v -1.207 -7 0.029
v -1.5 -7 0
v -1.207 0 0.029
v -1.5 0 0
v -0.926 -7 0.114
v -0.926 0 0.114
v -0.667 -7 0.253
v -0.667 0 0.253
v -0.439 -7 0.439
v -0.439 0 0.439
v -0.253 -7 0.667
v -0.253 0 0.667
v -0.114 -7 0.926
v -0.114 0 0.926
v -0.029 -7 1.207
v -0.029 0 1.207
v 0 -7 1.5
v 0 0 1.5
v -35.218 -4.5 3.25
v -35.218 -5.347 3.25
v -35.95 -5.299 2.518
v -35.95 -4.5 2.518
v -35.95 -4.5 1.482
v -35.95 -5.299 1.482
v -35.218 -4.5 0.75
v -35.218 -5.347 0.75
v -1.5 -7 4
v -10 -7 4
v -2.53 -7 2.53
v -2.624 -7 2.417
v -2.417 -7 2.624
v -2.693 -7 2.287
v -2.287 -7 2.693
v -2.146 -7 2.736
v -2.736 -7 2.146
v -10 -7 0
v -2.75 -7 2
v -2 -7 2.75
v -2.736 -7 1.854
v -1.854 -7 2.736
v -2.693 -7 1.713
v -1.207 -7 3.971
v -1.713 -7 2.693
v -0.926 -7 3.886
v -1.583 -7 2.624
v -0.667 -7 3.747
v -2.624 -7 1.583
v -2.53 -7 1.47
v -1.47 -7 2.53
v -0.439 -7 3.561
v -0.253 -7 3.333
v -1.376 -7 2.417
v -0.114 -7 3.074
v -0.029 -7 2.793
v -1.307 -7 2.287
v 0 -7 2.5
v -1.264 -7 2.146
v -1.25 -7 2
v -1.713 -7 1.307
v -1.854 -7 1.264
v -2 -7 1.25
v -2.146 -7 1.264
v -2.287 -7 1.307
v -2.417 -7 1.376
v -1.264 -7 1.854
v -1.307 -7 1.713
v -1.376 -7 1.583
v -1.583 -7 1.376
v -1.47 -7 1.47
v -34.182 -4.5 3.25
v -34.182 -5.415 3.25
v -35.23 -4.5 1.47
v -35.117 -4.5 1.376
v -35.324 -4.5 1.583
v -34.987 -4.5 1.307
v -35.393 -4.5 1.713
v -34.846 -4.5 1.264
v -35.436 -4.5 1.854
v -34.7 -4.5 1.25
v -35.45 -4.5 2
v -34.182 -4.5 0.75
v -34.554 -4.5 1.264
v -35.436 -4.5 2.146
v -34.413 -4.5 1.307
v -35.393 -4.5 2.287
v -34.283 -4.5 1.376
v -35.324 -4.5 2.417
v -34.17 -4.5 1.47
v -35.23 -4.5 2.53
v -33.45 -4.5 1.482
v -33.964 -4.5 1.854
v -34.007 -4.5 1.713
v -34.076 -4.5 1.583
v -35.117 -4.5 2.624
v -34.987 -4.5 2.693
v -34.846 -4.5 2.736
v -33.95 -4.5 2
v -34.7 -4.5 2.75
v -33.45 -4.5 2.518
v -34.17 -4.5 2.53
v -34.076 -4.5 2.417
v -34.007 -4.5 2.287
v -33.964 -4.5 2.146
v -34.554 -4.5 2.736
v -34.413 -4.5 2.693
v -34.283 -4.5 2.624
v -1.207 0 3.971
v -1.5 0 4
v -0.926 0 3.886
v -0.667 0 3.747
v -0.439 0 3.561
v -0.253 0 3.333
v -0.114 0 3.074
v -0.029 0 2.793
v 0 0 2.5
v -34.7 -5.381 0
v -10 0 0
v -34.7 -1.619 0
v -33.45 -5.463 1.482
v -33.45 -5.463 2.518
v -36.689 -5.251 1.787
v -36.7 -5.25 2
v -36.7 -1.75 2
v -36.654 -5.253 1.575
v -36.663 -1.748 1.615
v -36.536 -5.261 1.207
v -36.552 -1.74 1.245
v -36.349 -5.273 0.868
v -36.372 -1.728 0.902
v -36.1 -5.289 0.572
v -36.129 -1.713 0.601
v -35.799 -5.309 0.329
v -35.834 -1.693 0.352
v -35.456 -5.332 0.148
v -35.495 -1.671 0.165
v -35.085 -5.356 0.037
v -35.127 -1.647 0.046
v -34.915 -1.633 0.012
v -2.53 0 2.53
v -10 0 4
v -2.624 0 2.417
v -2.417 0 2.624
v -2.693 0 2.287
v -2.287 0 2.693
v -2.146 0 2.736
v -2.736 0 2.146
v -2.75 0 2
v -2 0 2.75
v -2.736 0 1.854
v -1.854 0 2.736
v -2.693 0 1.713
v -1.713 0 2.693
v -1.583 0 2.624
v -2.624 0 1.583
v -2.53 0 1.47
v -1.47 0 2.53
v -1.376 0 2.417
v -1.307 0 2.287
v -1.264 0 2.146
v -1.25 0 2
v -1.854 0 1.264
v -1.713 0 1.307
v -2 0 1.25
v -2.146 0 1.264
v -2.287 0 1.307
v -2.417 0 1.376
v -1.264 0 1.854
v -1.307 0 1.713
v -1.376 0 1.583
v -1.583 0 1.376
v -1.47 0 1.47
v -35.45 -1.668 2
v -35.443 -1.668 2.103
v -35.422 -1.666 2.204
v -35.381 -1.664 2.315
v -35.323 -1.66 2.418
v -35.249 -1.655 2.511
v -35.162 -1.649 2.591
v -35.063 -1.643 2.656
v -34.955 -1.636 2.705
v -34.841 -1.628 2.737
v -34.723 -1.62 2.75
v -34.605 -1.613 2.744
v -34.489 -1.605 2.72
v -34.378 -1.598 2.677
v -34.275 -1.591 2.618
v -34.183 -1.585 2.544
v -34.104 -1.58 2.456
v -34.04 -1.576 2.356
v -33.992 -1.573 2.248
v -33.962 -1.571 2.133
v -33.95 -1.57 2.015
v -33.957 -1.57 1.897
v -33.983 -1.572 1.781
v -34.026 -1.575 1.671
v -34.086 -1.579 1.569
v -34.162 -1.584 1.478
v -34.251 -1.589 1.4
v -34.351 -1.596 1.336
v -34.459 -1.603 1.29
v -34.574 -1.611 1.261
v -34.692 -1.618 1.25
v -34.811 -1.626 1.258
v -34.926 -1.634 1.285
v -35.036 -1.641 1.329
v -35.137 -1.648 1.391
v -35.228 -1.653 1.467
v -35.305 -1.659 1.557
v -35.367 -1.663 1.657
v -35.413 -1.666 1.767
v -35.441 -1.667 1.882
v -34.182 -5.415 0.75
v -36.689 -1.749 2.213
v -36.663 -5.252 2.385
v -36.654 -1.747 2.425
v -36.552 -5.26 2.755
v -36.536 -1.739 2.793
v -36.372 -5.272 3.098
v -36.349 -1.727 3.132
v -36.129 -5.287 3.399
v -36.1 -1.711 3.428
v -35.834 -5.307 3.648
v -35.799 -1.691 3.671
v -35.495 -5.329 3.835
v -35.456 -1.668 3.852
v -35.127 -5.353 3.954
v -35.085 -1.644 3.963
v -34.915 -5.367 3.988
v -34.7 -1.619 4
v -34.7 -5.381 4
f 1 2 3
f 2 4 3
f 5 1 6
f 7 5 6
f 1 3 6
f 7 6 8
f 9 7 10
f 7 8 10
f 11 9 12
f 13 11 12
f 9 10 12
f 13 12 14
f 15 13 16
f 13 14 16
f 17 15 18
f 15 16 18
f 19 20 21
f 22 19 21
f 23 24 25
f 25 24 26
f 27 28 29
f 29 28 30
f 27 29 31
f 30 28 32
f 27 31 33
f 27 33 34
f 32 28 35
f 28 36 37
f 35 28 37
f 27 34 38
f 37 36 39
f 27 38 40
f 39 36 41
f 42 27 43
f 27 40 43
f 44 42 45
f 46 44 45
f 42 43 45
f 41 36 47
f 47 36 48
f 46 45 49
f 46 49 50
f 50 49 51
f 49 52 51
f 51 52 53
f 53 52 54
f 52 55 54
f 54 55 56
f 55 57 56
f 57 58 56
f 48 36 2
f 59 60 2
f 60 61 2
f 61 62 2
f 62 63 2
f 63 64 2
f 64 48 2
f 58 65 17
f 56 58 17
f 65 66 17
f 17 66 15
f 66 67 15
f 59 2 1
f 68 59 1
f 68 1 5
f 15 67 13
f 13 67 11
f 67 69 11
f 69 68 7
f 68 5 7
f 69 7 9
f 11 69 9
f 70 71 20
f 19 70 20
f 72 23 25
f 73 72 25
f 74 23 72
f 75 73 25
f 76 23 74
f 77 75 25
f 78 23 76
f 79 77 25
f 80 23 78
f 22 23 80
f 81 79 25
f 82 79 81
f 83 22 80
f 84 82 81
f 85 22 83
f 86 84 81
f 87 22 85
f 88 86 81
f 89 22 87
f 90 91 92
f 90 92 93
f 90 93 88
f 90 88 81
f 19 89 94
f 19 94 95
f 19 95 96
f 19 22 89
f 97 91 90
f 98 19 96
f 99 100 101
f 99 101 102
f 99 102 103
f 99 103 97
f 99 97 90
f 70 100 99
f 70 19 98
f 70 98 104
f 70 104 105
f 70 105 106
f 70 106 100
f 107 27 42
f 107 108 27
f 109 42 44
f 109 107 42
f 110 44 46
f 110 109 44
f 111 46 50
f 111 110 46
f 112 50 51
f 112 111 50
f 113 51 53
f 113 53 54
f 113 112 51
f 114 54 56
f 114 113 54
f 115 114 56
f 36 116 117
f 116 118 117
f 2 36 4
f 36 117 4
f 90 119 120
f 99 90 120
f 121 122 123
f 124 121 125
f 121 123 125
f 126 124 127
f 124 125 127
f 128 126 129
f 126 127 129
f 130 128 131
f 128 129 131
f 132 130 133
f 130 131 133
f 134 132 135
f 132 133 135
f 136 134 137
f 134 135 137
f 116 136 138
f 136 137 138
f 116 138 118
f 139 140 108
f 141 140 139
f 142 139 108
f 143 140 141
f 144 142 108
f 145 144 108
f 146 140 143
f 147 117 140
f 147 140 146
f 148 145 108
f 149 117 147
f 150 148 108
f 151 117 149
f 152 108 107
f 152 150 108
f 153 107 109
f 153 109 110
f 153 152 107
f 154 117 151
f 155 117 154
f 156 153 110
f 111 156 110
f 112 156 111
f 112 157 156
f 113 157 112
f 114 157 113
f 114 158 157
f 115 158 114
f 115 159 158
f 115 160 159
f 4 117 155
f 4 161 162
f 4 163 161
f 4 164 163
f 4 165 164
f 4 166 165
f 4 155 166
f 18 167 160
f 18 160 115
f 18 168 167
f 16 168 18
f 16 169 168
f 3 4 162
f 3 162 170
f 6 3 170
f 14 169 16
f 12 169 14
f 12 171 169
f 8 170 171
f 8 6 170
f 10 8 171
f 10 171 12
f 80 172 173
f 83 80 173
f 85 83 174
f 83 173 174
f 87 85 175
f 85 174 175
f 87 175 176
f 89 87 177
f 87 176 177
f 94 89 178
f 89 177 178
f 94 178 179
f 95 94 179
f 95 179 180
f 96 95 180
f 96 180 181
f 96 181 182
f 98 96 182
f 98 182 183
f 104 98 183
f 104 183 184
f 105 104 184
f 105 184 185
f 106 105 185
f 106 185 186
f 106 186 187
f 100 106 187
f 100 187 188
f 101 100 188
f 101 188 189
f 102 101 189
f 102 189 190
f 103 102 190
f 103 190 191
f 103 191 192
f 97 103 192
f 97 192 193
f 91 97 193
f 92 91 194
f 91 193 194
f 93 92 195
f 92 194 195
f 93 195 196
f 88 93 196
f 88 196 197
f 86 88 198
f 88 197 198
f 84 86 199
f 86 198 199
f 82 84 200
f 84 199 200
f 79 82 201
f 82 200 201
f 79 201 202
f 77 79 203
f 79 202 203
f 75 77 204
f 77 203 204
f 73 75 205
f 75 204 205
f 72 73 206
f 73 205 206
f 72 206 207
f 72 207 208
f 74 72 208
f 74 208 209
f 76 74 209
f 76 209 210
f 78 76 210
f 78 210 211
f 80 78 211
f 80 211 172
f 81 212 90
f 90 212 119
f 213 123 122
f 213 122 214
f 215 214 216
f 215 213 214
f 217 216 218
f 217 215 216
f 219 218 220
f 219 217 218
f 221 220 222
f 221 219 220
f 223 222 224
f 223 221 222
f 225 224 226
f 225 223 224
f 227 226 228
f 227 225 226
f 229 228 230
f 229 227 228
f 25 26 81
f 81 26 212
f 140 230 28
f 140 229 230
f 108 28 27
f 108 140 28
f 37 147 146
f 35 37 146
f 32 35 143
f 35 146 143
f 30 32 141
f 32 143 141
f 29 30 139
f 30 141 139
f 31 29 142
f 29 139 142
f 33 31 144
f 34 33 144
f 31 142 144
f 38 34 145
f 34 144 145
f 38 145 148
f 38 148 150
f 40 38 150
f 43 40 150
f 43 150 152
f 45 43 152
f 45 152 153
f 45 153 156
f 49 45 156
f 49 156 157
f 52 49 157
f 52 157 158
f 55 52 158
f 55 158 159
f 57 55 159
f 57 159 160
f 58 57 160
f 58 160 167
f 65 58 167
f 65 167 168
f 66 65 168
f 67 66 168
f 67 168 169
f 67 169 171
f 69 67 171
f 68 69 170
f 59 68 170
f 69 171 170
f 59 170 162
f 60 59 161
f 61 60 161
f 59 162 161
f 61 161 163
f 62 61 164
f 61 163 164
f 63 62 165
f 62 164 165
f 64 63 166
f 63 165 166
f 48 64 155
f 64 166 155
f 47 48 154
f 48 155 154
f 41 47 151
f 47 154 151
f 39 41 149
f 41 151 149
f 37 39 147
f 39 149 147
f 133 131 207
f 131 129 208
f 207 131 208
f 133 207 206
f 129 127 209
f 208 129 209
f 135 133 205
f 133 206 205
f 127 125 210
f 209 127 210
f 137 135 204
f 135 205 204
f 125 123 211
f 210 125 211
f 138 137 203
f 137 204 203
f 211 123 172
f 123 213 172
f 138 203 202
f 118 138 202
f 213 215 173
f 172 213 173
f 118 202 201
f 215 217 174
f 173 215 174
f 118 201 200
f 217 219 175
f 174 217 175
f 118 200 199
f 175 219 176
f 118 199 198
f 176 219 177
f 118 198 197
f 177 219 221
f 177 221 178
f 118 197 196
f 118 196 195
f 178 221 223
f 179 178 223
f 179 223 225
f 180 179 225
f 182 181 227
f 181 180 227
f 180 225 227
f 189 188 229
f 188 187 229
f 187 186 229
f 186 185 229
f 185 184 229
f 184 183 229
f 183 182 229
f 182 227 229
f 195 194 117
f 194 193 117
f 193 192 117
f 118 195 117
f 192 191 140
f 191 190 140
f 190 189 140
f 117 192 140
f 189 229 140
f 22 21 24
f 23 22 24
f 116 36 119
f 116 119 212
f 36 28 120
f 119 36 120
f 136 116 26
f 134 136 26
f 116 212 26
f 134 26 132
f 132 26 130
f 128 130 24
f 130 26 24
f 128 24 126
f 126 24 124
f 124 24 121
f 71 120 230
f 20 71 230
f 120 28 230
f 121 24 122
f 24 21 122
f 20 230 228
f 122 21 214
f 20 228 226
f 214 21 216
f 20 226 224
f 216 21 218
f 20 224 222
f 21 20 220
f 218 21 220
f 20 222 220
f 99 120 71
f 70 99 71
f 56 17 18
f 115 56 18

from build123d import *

# Parameters (mm, degrees)
F0_W      = 36.7
F0_H      = 7
F1_DEPTH  = 4
F3_R      = 0.75
F4_DEPTH  = 25
F5_R      = 1.99999
F6_R      = 0.75
F7_DEPTH  = 25
F8_R      = 1.5
F9_R      = 0.75
F10_DEPTH = 2.5
F11_DEPTH = 25


# Not quite as in the source:
# - a fillet or chamfer is up to 0.001 mm smaller than in the source, because OpenCascade refuses the exact size


with BuildPart() as f1:
    # F0 (on Top) → F1 (new body)
    with BuildSketch(Plane.XY):
        with Locations((-18.35, -3.5)):
            Rectangle(F0_W, F0_H)
    extrude(amount=F1_DEPTH)

    # F3 (on face) → F4 (cut)
    with BuildSketch(Plane(origin=(0, 0, 0), x_dir=(-1, 0, 0), z_dir=(0, 1, 0))):
        with Locations((2, 2)):
            Circle(F3_R)
    extrude(amount=-F4_DEPTH, mode=Mode.SUBTRACT)

    # F5 (radius 2 in the source; OpenCascade refuses exactly that, so slightly less here)
    f5_edges = [f1.edges().sort_by_distance(p)[0] for p in [
        (-36.7, -3.5, 0),
        (-36.7, -3.5, 4),
    ]]
    fillet(f5_edges, radius=F5_R)

    # F6 (on face) → F7 (cut)
    with BuildSketch(Plane(origin=(0, 0, 0), x_dir=(-1, 0, 0), z_dir=(0, 1, 0))):
        with Locations((34.7, 2)):
            Circle(F6_R)
    extrude(amount=-F7_DEPTH, mode=Mode.SUBTRACT)

    # F8
    f8_edges = [f1.edges().sort_by_distance(p)[0] for p in [
        (0, -3.5, 4),
        (0, -3.5, 0),
    ]]
    fillet(f8_edges, radius=F8_R)

    # F9 (on face) → F10 (cut)
    with BuildSketch(Plane.XZ.offset(7)):
        Polygon((-33.45, 1.482233047), (-33.45, 2.517766953), (-34.182233047, 3.25), (-35.217766953, 3.25), (-35.95, 2.517766953), (-35.95, 1.482233047), (-35.217766953, 0.75), (-34.182233047, 0.75), align=None)
        with Locations((-34.7, 2)):
            Circle(F9_R, mode=Mode.SUBTRACT)
    extrude(amount=-F10_DEPTH, mode=Mode.SUBTRACT)

    # F2 (on face) → F11 (cut)
    with BuildSketch(Plane.XY.offset(4)):
        Polygon((-36.7, 0), (-36.7, -1.75), (-10, 0), align=None)
        Polygon((-10, -7), (-36.7, -5.25), (-36.7, -7), align=None)
    extrude(amount=-F11_DEPTH, mode=Mode.SUBTRACT)


solid = f1.part
